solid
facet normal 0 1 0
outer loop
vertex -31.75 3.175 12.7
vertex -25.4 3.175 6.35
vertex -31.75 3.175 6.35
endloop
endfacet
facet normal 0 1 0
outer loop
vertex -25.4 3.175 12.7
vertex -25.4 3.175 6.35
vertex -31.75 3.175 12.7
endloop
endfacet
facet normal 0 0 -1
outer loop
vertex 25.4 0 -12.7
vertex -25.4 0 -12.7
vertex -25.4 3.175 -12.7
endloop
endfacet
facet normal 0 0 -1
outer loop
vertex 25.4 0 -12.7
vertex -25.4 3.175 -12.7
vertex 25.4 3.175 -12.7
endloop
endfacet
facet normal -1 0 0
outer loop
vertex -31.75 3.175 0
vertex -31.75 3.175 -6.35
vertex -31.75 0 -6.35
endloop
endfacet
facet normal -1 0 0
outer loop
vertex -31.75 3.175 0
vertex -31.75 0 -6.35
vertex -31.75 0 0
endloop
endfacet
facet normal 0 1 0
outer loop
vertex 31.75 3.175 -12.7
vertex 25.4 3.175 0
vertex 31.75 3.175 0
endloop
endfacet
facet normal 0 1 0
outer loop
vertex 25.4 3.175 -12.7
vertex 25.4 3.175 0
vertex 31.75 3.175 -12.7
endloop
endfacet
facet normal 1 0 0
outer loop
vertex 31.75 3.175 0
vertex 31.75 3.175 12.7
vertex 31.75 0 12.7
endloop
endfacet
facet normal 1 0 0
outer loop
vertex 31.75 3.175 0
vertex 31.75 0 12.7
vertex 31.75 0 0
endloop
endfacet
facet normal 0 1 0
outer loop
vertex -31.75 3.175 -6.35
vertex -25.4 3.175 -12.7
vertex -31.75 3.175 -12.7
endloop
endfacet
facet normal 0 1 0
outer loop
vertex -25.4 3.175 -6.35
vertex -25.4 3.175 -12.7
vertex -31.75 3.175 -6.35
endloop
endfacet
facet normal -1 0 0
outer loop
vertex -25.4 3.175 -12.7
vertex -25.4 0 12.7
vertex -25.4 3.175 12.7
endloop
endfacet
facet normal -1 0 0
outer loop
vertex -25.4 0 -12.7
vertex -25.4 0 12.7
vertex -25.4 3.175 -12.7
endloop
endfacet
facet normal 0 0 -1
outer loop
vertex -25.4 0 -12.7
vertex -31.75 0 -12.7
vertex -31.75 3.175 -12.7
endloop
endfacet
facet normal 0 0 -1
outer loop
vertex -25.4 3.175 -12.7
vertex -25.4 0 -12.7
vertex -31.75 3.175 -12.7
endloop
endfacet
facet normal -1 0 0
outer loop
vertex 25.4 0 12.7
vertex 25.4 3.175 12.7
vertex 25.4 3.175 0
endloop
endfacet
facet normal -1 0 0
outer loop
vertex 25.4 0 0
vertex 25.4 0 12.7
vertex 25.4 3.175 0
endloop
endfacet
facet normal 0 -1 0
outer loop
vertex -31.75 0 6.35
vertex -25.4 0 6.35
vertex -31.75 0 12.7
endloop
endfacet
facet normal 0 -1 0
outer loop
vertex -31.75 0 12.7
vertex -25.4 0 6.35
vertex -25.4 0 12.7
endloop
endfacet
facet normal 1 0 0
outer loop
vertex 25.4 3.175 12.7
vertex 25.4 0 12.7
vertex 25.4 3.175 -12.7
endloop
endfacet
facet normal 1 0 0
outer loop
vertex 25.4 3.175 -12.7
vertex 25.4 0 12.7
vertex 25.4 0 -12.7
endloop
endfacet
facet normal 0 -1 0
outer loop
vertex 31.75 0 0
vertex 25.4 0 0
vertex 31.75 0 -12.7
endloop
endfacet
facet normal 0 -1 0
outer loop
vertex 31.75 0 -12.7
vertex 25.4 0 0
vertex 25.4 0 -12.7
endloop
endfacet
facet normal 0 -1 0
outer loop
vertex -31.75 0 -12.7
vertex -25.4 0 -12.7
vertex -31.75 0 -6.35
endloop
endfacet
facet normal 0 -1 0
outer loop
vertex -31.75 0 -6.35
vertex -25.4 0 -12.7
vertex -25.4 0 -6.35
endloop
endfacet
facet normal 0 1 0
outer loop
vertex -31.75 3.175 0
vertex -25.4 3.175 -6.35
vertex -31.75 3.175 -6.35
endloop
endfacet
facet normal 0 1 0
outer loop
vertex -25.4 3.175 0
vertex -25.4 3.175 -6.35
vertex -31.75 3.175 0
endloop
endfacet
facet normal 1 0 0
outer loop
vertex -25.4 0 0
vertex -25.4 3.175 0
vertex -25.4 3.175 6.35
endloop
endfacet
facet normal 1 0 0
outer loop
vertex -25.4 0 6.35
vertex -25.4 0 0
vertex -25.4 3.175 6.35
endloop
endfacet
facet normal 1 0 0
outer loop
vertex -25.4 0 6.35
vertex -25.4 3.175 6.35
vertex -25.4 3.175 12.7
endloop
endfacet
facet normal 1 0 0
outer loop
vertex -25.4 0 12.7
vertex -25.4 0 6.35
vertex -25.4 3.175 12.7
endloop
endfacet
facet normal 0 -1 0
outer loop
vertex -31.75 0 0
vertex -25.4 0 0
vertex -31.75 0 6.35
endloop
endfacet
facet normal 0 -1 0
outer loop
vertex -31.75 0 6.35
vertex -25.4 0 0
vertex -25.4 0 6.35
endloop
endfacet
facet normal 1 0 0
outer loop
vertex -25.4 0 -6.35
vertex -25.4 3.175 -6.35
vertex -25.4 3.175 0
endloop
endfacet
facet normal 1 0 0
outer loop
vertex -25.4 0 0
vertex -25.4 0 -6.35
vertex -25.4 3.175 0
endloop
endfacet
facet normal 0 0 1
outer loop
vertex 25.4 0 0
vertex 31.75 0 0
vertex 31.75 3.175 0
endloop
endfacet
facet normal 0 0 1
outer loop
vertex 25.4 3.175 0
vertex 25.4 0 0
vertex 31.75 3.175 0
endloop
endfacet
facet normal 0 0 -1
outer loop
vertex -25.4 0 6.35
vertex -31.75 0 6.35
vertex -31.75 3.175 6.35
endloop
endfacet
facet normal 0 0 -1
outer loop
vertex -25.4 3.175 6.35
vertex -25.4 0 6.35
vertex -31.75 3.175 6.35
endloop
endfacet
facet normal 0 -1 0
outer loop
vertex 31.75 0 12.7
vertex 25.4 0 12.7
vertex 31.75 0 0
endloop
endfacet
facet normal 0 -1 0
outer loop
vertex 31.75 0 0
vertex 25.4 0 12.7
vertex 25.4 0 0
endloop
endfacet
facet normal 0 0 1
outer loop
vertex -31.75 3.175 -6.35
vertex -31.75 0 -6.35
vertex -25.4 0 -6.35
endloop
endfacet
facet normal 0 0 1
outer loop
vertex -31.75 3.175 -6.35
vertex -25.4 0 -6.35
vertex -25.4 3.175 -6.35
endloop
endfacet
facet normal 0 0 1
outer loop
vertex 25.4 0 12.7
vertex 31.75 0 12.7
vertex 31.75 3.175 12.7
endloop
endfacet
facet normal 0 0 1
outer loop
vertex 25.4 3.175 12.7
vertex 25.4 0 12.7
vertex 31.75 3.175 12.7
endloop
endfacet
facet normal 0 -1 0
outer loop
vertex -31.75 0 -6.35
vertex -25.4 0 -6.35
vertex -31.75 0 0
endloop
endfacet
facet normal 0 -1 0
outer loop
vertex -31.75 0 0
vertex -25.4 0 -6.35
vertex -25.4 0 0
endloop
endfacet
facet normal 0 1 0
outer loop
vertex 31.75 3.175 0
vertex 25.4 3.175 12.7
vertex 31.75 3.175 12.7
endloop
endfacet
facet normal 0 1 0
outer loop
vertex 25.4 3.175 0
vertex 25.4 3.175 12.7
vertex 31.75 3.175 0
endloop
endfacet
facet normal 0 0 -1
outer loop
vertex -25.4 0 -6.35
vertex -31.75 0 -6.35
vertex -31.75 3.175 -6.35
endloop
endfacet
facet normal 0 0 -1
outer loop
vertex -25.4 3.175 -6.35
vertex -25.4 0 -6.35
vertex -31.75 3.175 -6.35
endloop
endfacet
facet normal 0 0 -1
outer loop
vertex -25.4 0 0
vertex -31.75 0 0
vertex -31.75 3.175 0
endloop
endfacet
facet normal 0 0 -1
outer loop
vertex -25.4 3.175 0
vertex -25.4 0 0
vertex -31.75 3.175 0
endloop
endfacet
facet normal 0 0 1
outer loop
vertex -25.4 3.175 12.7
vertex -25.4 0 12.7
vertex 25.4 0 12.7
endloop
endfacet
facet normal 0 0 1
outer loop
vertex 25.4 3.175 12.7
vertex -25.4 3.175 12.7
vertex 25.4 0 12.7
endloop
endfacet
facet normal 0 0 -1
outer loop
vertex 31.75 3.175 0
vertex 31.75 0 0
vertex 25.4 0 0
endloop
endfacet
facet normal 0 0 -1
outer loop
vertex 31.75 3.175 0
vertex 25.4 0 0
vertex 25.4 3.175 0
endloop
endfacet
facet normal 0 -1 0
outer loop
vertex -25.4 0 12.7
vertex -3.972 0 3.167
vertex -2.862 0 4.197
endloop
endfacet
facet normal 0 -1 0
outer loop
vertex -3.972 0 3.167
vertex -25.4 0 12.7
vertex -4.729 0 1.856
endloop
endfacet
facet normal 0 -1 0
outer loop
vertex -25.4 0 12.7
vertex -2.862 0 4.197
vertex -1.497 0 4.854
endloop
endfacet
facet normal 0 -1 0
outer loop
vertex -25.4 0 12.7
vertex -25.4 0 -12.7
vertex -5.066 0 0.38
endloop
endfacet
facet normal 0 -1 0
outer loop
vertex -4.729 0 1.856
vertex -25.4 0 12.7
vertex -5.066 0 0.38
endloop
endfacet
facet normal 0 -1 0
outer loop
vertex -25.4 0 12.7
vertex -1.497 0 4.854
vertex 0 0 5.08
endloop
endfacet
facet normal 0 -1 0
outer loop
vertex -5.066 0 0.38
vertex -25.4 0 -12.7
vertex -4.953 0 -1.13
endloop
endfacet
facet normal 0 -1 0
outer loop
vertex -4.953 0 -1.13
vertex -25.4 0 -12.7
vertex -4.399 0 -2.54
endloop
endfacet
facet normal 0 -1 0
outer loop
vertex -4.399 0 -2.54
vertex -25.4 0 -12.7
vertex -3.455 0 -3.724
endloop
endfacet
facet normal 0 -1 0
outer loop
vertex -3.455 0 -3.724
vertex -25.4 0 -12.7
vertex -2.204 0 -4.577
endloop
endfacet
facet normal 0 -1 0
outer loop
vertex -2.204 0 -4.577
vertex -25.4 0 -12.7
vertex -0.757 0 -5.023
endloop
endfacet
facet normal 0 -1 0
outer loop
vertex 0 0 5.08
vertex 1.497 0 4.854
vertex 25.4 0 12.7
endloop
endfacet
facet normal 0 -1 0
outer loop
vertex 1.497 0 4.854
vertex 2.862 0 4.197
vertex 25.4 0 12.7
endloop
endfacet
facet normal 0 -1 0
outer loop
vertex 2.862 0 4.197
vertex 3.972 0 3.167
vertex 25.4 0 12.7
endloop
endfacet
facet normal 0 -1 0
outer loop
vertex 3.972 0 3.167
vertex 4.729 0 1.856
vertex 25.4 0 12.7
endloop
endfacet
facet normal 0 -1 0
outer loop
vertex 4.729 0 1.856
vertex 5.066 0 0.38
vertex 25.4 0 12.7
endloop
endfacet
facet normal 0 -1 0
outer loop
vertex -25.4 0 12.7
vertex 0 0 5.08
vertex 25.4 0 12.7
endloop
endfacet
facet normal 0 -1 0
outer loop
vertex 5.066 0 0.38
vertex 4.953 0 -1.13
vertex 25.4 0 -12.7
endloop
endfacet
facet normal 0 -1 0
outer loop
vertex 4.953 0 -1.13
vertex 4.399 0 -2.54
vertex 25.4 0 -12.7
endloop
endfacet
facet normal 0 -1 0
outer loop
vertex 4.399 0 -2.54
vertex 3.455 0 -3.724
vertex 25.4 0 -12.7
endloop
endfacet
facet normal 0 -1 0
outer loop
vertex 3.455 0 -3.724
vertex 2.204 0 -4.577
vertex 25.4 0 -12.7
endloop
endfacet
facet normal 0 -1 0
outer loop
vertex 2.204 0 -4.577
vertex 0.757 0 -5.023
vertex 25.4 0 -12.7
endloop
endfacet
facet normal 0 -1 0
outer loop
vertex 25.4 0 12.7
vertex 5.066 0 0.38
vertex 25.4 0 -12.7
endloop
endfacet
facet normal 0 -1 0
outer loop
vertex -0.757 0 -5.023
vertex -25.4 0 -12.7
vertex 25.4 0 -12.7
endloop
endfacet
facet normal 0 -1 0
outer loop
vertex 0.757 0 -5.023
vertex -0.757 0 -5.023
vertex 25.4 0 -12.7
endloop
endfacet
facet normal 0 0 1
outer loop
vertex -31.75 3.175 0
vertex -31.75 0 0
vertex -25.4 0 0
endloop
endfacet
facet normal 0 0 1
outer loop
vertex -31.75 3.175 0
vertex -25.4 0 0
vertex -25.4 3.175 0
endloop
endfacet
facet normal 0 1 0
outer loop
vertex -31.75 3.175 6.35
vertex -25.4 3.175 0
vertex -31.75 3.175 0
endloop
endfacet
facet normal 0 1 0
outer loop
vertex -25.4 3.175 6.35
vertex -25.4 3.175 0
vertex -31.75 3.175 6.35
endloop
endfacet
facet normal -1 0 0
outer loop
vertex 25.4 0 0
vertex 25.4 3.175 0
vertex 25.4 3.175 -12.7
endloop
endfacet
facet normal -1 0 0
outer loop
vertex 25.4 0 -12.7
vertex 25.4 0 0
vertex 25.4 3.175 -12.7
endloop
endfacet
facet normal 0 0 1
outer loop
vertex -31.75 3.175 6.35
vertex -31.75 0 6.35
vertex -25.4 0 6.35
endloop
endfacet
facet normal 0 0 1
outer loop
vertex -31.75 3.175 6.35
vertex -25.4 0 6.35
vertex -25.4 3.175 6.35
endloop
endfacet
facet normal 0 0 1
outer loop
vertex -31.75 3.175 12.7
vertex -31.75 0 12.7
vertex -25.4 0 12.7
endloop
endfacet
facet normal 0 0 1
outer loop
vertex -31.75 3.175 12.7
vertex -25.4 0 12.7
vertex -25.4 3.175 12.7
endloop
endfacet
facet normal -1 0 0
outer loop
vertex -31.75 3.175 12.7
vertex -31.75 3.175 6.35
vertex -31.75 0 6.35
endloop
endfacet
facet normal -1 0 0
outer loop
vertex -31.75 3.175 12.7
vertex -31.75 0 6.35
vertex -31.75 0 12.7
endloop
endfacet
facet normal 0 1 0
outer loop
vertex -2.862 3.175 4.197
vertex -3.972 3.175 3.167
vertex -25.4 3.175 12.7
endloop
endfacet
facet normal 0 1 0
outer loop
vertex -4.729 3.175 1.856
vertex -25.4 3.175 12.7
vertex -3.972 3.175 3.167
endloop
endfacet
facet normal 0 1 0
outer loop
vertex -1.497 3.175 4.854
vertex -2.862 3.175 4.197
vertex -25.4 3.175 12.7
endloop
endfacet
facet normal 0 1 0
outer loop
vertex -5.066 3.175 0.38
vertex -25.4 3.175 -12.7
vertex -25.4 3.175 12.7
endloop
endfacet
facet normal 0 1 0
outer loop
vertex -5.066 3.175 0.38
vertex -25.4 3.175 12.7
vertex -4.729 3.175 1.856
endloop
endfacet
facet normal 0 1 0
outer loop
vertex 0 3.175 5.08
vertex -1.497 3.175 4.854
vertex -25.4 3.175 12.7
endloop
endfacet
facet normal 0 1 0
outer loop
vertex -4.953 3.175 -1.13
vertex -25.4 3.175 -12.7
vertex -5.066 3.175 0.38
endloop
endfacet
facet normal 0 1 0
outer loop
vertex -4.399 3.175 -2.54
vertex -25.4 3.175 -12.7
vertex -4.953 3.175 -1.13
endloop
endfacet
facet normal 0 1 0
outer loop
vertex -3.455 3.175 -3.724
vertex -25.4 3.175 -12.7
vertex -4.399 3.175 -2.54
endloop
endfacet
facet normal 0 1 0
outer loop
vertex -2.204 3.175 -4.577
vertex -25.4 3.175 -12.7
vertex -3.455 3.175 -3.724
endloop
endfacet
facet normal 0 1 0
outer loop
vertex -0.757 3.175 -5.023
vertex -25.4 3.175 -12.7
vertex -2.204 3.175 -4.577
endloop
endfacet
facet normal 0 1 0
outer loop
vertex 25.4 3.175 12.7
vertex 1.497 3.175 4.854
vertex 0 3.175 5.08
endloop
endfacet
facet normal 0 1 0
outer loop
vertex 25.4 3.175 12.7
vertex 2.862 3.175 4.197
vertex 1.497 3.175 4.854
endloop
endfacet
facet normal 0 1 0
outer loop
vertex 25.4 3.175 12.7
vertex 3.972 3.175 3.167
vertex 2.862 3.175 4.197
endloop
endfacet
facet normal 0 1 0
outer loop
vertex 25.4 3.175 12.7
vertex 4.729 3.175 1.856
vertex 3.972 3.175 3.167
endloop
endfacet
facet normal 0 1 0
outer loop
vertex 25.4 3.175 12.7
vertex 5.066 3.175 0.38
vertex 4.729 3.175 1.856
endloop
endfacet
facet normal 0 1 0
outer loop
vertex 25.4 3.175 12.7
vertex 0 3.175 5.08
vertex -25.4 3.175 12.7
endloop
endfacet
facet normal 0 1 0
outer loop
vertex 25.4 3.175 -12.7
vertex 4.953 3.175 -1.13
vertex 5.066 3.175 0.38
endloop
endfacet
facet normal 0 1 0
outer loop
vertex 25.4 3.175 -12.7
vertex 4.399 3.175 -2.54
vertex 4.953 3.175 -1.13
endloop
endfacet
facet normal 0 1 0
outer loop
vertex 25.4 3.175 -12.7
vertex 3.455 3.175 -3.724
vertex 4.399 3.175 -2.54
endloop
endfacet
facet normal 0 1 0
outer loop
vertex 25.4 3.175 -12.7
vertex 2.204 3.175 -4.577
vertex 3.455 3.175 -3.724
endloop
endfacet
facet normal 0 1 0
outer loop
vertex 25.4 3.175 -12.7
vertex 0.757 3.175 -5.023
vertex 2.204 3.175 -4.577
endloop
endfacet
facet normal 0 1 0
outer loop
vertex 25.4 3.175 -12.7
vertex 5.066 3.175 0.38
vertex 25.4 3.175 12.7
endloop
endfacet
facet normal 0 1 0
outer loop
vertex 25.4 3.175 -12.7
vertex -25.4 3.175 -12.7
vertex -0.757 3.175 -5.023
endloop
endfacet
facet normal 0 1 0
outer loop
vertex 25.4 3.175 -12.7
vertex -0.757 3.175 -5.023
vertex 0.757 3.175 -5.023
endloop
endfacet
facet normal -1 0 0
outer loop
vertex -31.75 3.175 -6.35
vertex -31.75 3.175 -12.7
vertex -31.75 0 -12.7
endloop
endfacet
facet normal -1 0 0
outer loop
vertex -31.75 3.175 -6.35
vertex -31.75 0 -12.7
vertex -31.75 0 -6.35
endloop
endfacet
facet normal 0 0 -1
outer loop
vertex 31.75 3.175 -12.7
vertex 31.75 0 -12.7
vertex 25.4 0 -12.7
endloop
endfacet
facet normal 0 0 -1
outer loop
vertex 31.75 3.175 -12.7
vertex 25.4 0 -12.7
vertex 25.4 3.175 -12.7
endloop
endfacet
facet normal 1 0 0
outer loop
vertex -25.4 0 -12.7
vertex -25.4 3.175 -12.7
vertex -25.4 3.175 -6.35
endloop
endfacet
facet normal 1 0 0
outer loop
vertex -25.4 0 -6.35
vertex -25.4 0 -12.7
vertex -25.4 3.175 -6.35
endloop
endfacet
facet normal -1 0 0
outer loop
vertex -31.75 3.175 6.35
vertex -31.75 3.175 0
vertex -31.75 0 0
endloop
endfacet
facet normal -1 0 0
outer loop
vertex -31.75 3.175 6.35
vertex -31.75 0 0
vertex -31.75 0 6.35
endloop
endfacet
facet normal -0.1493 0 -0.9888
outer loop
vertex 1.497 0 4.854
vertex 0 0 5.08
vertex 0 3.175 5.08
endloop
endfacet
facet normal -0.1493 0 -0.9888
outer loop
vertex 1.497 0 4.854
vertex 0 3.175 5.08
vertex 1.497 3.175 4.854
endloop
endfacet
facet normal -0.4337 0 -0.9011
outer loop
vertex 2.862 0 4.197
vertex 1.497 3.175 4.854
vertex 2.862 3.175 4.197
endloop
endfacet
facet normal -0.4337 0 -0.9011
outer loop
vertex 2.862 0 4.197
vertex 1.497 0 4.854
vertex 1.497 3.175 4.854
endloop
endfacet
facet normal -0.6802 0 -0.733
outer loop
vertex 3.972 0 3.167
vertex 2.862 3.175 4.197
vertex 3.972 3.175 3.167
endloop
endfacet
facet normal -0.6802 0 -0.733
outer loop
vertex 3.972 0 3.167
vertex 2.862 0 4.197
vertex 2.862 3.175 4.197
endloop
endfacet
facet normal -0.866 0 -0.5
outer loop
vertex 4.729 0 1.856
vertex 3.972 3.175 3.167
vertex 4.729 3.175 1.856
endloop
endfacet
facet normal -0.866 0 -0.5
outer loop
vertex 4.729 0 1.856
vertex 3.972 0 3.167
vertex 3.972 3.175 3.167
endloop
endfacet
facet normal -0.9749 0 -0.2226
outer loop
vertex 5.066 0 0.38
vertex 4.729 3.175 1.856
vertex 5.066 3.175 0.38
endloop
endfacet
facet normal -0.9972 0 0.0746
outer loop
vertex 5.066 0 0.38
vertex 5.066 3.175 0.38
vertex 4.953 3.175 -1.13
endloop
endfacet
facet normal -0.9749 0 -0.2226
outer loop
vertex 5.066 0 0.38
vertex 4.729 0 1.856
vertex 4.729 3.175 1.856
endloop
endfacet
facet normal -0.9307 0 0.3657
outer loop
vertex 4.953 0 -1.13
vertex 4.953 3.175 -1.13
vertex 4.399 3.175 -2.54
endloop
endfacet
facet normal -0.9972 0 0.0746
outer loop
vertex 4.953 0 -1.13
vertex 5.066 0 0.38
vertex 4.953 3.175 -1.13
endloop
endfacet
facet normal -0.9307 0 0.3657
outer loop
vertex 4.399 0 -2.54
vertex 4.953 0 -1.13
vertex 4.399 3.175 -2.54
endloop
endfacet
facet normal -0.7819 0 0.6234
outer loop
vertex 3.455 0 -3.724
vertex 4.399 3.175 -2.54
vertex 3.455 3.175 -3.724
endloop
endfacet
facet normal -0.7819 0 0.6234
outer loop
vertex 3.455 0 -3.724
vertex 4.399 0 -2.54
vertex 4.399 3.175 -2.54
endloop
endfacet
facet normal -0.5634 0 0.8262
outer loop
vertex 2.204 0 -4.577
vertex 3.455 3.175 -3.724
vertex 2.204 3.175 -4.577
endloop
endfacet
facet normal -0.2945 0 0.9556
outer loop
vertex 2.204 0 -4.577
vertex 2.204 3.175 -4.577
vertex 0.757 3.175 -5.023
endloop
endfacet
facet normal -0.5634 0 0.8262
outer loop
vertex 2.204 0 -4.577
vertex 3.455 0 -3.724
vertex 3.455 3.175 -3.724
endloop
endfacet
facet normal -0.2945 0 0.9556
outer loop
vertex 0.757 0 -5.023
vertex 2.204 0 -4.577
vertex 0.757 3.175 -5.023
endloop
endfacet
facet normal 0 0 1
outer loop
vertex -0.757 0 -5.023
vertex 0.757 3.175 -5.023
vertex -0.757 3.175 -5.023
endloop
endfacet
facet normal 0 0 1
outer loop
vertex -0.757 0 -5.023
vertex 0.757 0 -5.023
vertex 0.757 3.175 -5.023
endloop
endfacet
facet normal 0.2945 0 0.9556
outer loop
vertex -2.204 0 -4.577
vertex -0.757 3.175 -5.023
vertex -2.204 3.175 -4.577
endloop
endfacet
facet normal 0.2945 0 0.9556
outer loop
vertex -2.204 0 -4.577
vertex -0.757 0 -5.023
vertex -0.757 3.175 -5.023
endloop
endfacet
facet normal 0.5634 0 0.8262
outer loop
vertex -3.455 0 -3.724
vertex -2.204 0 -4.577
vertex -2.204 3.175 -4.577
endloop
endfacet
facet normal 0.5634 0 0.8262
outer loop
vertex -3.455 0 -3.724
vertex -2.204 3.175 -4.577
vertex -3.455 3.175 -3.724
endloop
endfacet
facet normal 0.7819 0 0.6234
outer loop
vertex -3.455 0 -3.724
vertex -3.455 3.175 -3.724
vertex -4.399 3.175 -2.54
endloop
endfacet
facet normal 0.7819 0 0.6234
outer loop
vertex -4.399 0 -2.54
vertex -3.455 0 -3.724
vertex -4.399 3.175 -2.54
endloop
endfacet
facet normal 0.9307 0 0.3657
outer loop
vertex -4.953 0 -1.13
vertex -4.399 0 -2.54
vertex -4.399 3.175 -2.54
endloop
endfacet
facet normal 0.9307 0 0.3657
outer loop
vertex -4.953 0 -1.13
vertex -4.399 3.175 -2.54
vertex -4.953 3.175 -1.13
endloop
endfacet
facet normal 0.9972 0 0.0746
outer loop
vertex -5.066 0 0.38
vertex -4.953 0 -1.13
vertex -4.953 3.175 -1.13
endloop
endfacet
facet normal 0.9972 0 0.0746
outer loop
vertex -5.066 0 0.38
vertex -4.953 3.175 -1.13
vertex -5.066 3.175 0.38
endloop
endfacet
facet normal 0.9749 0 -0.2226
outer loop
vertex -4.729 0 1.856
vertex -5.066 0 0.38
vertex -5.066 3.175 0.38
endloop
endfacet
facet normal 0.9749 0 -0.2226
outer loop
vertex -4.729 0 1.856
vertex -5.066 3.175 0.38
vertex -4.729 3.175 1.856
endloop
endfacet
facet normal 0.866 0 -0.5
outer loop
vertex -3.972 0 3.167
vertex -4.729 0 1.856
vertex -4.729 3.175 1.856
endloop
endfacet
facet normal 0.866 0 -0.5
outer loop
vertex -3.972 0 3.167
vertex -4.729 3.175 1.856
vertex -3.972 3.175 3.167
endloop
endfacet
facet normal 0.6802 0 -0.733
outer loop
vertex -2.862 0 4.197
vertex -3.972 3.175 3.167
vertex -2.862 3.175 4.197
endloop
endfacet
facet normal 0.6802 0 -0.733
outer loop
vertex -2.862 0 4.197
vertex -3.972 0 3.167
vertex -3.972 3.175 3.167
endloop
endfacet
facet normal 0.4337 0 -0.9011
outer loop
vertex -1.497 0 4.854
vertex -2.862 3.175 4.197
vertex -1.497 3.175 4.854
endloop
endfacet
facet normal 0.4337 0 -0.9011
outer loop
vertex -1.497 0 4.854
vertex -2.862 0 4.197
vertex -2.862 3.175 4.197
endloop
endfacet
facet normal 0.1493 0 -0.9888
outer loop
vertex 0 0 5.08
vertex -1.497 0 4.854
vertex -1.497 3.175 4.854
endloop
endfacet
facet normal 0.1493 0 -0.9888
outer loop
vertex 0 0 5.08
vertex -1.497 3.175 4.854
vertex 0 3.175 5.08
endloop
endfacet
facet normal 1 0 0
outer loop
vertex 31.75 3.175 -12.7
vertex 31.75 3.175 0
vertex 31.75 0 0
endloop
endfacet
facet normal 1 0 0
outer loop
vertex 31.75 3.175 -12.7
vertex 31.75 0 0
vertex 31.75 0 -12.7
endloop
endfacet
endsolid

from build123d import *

# Parameters (mm, degrees)
SKETCH1_W           = 50.8
SKETCH1_H           = 25.4
SKETCH1_R           = 5.08
BOSS_EXTRUDE1_DEPTH = 3.175
SKETCH2_W           = 6.35
SKETCH2_H           = 3.175
BOSS_EXTRUDE3_DEPTH = 6.35
SKETCH2_4_W         = 6.35
SKETCH2_4_H         = 3.175
BOSS_EXTRUDE4_DEPTH = 6.35
SKETCH2_6_W         = 6.35
SKETCH2_6_H         = 3.175
BOSS_EXTRUDE6_DEPTH = 6.35
SKETCH2_7_W         = 6.35
SKETCH2_7_H         = 3.175
BOSS_EXTRUDE7_DEPTH = 6.35
SKETCH4_W           = 12.7
SKETCH4_H           = 3.175
BOSS_EXTRUDE8_DEPTH = 6.35
SKETCH4_3_W         = 12.7
SKETCH4_3_H         = 3.175
BOSS_EXTRUDE9_DEPTH = 6.35


with BuildPart() as part:
    # Sketch1 → Boss-Extrude1 (new body)
    with BuildSketch(Plane(origin=(0, 0, 0), x_dir=(1, 0, 0), z_dir=(0, 1, 0))):
        Rectangle(SKETCH1_W, SKETCH1_H)
        Circle(SKETCH1_R, mode=Mode.SUBTRACT)
    extrude(amount=BOSS_EXTRUDE1_DEPTH)


with BuildPart() as body_2:
    # Sketch2 → Boss-Extrude3 (new body)
    with BuildSketch(Plane.ZY.offset(25.4)):
        with Locations((-9.525, 1.5875)):
            Rectangle(SKETCH2_W, SKETCH2_H)
    extrude(amount=BOSS_EXTRUDE3_DEPTH)


with BuildPart() as body_3:
    # Sketch2<4> → Boss-Extrude4 (new body)
    with BuildSketch(Plane.ZY.offset(25.4)):
        with Locations((-3.175, 1.5875)):
            Rectangle(SKETCH2_4_W, SKETCH2_4_H)
    extrude(amount=BOSS_EXTRUDE4_DEPTH)


with BuildPart() as body_4:
    # Sketch2<6> → Boss-Extrude6 (new body)
    with BuildSketch(Plane.ZY.offset(25.4)):
        with Locations((3.175, 1.5875)):
            Rectangle(SKETCH2_6_W, SKETCH2_6_H)
    extrude(amount=BOSS_EXTRUDE6_DEPTH)


with BuildPart() as body_5:
    # Sketch2<7> → Boss-Extrude7 (new body)
    with BuildSketch(Plane.ZY.offset(25.4)):
        with Locations((9.525, 1.5875)):
            Rectangle(SKETCH2_7_W, SKETCH2_7_H)
    extrude(amount=BOSS_EXTRUDE7_DEPTH)


with BuildPart() as body_6:
    # Sketch4 → Boss-Extrude8 (new body)
    with BuildSketch(Plane(origin=(25.4, 0, 0), x_dir=(0, 0, -1), z_dir=(1, 0, 0))):
        with Locations((-6.35, 1.5875)):
            Rectangle(SKETCH4_W, SKETCH4_H)
    extrude(amount=BOSS_EXTRUDE8_DEPTH)


with BuildPart() as body_7:
    # Sketch4<3> → Boss-Extrude9 (new body)
    with BuildSketch(Plane(origin=(25.4, 0, 0), x_dir=(0, 0, -1), z_dir=(1, 0, 0))):
        with Locations((6.35, 1.5875)):
            Rectangle(SKETCH4_3_W, SKETCH4_3_H)
    extrude(amount=BOSS_EXTRUDE9_DEPTH)


solid = Compound([part.part, body_2.part, body_3.part, body_4.part, body_5.part, body_6.part, body_7.part])
